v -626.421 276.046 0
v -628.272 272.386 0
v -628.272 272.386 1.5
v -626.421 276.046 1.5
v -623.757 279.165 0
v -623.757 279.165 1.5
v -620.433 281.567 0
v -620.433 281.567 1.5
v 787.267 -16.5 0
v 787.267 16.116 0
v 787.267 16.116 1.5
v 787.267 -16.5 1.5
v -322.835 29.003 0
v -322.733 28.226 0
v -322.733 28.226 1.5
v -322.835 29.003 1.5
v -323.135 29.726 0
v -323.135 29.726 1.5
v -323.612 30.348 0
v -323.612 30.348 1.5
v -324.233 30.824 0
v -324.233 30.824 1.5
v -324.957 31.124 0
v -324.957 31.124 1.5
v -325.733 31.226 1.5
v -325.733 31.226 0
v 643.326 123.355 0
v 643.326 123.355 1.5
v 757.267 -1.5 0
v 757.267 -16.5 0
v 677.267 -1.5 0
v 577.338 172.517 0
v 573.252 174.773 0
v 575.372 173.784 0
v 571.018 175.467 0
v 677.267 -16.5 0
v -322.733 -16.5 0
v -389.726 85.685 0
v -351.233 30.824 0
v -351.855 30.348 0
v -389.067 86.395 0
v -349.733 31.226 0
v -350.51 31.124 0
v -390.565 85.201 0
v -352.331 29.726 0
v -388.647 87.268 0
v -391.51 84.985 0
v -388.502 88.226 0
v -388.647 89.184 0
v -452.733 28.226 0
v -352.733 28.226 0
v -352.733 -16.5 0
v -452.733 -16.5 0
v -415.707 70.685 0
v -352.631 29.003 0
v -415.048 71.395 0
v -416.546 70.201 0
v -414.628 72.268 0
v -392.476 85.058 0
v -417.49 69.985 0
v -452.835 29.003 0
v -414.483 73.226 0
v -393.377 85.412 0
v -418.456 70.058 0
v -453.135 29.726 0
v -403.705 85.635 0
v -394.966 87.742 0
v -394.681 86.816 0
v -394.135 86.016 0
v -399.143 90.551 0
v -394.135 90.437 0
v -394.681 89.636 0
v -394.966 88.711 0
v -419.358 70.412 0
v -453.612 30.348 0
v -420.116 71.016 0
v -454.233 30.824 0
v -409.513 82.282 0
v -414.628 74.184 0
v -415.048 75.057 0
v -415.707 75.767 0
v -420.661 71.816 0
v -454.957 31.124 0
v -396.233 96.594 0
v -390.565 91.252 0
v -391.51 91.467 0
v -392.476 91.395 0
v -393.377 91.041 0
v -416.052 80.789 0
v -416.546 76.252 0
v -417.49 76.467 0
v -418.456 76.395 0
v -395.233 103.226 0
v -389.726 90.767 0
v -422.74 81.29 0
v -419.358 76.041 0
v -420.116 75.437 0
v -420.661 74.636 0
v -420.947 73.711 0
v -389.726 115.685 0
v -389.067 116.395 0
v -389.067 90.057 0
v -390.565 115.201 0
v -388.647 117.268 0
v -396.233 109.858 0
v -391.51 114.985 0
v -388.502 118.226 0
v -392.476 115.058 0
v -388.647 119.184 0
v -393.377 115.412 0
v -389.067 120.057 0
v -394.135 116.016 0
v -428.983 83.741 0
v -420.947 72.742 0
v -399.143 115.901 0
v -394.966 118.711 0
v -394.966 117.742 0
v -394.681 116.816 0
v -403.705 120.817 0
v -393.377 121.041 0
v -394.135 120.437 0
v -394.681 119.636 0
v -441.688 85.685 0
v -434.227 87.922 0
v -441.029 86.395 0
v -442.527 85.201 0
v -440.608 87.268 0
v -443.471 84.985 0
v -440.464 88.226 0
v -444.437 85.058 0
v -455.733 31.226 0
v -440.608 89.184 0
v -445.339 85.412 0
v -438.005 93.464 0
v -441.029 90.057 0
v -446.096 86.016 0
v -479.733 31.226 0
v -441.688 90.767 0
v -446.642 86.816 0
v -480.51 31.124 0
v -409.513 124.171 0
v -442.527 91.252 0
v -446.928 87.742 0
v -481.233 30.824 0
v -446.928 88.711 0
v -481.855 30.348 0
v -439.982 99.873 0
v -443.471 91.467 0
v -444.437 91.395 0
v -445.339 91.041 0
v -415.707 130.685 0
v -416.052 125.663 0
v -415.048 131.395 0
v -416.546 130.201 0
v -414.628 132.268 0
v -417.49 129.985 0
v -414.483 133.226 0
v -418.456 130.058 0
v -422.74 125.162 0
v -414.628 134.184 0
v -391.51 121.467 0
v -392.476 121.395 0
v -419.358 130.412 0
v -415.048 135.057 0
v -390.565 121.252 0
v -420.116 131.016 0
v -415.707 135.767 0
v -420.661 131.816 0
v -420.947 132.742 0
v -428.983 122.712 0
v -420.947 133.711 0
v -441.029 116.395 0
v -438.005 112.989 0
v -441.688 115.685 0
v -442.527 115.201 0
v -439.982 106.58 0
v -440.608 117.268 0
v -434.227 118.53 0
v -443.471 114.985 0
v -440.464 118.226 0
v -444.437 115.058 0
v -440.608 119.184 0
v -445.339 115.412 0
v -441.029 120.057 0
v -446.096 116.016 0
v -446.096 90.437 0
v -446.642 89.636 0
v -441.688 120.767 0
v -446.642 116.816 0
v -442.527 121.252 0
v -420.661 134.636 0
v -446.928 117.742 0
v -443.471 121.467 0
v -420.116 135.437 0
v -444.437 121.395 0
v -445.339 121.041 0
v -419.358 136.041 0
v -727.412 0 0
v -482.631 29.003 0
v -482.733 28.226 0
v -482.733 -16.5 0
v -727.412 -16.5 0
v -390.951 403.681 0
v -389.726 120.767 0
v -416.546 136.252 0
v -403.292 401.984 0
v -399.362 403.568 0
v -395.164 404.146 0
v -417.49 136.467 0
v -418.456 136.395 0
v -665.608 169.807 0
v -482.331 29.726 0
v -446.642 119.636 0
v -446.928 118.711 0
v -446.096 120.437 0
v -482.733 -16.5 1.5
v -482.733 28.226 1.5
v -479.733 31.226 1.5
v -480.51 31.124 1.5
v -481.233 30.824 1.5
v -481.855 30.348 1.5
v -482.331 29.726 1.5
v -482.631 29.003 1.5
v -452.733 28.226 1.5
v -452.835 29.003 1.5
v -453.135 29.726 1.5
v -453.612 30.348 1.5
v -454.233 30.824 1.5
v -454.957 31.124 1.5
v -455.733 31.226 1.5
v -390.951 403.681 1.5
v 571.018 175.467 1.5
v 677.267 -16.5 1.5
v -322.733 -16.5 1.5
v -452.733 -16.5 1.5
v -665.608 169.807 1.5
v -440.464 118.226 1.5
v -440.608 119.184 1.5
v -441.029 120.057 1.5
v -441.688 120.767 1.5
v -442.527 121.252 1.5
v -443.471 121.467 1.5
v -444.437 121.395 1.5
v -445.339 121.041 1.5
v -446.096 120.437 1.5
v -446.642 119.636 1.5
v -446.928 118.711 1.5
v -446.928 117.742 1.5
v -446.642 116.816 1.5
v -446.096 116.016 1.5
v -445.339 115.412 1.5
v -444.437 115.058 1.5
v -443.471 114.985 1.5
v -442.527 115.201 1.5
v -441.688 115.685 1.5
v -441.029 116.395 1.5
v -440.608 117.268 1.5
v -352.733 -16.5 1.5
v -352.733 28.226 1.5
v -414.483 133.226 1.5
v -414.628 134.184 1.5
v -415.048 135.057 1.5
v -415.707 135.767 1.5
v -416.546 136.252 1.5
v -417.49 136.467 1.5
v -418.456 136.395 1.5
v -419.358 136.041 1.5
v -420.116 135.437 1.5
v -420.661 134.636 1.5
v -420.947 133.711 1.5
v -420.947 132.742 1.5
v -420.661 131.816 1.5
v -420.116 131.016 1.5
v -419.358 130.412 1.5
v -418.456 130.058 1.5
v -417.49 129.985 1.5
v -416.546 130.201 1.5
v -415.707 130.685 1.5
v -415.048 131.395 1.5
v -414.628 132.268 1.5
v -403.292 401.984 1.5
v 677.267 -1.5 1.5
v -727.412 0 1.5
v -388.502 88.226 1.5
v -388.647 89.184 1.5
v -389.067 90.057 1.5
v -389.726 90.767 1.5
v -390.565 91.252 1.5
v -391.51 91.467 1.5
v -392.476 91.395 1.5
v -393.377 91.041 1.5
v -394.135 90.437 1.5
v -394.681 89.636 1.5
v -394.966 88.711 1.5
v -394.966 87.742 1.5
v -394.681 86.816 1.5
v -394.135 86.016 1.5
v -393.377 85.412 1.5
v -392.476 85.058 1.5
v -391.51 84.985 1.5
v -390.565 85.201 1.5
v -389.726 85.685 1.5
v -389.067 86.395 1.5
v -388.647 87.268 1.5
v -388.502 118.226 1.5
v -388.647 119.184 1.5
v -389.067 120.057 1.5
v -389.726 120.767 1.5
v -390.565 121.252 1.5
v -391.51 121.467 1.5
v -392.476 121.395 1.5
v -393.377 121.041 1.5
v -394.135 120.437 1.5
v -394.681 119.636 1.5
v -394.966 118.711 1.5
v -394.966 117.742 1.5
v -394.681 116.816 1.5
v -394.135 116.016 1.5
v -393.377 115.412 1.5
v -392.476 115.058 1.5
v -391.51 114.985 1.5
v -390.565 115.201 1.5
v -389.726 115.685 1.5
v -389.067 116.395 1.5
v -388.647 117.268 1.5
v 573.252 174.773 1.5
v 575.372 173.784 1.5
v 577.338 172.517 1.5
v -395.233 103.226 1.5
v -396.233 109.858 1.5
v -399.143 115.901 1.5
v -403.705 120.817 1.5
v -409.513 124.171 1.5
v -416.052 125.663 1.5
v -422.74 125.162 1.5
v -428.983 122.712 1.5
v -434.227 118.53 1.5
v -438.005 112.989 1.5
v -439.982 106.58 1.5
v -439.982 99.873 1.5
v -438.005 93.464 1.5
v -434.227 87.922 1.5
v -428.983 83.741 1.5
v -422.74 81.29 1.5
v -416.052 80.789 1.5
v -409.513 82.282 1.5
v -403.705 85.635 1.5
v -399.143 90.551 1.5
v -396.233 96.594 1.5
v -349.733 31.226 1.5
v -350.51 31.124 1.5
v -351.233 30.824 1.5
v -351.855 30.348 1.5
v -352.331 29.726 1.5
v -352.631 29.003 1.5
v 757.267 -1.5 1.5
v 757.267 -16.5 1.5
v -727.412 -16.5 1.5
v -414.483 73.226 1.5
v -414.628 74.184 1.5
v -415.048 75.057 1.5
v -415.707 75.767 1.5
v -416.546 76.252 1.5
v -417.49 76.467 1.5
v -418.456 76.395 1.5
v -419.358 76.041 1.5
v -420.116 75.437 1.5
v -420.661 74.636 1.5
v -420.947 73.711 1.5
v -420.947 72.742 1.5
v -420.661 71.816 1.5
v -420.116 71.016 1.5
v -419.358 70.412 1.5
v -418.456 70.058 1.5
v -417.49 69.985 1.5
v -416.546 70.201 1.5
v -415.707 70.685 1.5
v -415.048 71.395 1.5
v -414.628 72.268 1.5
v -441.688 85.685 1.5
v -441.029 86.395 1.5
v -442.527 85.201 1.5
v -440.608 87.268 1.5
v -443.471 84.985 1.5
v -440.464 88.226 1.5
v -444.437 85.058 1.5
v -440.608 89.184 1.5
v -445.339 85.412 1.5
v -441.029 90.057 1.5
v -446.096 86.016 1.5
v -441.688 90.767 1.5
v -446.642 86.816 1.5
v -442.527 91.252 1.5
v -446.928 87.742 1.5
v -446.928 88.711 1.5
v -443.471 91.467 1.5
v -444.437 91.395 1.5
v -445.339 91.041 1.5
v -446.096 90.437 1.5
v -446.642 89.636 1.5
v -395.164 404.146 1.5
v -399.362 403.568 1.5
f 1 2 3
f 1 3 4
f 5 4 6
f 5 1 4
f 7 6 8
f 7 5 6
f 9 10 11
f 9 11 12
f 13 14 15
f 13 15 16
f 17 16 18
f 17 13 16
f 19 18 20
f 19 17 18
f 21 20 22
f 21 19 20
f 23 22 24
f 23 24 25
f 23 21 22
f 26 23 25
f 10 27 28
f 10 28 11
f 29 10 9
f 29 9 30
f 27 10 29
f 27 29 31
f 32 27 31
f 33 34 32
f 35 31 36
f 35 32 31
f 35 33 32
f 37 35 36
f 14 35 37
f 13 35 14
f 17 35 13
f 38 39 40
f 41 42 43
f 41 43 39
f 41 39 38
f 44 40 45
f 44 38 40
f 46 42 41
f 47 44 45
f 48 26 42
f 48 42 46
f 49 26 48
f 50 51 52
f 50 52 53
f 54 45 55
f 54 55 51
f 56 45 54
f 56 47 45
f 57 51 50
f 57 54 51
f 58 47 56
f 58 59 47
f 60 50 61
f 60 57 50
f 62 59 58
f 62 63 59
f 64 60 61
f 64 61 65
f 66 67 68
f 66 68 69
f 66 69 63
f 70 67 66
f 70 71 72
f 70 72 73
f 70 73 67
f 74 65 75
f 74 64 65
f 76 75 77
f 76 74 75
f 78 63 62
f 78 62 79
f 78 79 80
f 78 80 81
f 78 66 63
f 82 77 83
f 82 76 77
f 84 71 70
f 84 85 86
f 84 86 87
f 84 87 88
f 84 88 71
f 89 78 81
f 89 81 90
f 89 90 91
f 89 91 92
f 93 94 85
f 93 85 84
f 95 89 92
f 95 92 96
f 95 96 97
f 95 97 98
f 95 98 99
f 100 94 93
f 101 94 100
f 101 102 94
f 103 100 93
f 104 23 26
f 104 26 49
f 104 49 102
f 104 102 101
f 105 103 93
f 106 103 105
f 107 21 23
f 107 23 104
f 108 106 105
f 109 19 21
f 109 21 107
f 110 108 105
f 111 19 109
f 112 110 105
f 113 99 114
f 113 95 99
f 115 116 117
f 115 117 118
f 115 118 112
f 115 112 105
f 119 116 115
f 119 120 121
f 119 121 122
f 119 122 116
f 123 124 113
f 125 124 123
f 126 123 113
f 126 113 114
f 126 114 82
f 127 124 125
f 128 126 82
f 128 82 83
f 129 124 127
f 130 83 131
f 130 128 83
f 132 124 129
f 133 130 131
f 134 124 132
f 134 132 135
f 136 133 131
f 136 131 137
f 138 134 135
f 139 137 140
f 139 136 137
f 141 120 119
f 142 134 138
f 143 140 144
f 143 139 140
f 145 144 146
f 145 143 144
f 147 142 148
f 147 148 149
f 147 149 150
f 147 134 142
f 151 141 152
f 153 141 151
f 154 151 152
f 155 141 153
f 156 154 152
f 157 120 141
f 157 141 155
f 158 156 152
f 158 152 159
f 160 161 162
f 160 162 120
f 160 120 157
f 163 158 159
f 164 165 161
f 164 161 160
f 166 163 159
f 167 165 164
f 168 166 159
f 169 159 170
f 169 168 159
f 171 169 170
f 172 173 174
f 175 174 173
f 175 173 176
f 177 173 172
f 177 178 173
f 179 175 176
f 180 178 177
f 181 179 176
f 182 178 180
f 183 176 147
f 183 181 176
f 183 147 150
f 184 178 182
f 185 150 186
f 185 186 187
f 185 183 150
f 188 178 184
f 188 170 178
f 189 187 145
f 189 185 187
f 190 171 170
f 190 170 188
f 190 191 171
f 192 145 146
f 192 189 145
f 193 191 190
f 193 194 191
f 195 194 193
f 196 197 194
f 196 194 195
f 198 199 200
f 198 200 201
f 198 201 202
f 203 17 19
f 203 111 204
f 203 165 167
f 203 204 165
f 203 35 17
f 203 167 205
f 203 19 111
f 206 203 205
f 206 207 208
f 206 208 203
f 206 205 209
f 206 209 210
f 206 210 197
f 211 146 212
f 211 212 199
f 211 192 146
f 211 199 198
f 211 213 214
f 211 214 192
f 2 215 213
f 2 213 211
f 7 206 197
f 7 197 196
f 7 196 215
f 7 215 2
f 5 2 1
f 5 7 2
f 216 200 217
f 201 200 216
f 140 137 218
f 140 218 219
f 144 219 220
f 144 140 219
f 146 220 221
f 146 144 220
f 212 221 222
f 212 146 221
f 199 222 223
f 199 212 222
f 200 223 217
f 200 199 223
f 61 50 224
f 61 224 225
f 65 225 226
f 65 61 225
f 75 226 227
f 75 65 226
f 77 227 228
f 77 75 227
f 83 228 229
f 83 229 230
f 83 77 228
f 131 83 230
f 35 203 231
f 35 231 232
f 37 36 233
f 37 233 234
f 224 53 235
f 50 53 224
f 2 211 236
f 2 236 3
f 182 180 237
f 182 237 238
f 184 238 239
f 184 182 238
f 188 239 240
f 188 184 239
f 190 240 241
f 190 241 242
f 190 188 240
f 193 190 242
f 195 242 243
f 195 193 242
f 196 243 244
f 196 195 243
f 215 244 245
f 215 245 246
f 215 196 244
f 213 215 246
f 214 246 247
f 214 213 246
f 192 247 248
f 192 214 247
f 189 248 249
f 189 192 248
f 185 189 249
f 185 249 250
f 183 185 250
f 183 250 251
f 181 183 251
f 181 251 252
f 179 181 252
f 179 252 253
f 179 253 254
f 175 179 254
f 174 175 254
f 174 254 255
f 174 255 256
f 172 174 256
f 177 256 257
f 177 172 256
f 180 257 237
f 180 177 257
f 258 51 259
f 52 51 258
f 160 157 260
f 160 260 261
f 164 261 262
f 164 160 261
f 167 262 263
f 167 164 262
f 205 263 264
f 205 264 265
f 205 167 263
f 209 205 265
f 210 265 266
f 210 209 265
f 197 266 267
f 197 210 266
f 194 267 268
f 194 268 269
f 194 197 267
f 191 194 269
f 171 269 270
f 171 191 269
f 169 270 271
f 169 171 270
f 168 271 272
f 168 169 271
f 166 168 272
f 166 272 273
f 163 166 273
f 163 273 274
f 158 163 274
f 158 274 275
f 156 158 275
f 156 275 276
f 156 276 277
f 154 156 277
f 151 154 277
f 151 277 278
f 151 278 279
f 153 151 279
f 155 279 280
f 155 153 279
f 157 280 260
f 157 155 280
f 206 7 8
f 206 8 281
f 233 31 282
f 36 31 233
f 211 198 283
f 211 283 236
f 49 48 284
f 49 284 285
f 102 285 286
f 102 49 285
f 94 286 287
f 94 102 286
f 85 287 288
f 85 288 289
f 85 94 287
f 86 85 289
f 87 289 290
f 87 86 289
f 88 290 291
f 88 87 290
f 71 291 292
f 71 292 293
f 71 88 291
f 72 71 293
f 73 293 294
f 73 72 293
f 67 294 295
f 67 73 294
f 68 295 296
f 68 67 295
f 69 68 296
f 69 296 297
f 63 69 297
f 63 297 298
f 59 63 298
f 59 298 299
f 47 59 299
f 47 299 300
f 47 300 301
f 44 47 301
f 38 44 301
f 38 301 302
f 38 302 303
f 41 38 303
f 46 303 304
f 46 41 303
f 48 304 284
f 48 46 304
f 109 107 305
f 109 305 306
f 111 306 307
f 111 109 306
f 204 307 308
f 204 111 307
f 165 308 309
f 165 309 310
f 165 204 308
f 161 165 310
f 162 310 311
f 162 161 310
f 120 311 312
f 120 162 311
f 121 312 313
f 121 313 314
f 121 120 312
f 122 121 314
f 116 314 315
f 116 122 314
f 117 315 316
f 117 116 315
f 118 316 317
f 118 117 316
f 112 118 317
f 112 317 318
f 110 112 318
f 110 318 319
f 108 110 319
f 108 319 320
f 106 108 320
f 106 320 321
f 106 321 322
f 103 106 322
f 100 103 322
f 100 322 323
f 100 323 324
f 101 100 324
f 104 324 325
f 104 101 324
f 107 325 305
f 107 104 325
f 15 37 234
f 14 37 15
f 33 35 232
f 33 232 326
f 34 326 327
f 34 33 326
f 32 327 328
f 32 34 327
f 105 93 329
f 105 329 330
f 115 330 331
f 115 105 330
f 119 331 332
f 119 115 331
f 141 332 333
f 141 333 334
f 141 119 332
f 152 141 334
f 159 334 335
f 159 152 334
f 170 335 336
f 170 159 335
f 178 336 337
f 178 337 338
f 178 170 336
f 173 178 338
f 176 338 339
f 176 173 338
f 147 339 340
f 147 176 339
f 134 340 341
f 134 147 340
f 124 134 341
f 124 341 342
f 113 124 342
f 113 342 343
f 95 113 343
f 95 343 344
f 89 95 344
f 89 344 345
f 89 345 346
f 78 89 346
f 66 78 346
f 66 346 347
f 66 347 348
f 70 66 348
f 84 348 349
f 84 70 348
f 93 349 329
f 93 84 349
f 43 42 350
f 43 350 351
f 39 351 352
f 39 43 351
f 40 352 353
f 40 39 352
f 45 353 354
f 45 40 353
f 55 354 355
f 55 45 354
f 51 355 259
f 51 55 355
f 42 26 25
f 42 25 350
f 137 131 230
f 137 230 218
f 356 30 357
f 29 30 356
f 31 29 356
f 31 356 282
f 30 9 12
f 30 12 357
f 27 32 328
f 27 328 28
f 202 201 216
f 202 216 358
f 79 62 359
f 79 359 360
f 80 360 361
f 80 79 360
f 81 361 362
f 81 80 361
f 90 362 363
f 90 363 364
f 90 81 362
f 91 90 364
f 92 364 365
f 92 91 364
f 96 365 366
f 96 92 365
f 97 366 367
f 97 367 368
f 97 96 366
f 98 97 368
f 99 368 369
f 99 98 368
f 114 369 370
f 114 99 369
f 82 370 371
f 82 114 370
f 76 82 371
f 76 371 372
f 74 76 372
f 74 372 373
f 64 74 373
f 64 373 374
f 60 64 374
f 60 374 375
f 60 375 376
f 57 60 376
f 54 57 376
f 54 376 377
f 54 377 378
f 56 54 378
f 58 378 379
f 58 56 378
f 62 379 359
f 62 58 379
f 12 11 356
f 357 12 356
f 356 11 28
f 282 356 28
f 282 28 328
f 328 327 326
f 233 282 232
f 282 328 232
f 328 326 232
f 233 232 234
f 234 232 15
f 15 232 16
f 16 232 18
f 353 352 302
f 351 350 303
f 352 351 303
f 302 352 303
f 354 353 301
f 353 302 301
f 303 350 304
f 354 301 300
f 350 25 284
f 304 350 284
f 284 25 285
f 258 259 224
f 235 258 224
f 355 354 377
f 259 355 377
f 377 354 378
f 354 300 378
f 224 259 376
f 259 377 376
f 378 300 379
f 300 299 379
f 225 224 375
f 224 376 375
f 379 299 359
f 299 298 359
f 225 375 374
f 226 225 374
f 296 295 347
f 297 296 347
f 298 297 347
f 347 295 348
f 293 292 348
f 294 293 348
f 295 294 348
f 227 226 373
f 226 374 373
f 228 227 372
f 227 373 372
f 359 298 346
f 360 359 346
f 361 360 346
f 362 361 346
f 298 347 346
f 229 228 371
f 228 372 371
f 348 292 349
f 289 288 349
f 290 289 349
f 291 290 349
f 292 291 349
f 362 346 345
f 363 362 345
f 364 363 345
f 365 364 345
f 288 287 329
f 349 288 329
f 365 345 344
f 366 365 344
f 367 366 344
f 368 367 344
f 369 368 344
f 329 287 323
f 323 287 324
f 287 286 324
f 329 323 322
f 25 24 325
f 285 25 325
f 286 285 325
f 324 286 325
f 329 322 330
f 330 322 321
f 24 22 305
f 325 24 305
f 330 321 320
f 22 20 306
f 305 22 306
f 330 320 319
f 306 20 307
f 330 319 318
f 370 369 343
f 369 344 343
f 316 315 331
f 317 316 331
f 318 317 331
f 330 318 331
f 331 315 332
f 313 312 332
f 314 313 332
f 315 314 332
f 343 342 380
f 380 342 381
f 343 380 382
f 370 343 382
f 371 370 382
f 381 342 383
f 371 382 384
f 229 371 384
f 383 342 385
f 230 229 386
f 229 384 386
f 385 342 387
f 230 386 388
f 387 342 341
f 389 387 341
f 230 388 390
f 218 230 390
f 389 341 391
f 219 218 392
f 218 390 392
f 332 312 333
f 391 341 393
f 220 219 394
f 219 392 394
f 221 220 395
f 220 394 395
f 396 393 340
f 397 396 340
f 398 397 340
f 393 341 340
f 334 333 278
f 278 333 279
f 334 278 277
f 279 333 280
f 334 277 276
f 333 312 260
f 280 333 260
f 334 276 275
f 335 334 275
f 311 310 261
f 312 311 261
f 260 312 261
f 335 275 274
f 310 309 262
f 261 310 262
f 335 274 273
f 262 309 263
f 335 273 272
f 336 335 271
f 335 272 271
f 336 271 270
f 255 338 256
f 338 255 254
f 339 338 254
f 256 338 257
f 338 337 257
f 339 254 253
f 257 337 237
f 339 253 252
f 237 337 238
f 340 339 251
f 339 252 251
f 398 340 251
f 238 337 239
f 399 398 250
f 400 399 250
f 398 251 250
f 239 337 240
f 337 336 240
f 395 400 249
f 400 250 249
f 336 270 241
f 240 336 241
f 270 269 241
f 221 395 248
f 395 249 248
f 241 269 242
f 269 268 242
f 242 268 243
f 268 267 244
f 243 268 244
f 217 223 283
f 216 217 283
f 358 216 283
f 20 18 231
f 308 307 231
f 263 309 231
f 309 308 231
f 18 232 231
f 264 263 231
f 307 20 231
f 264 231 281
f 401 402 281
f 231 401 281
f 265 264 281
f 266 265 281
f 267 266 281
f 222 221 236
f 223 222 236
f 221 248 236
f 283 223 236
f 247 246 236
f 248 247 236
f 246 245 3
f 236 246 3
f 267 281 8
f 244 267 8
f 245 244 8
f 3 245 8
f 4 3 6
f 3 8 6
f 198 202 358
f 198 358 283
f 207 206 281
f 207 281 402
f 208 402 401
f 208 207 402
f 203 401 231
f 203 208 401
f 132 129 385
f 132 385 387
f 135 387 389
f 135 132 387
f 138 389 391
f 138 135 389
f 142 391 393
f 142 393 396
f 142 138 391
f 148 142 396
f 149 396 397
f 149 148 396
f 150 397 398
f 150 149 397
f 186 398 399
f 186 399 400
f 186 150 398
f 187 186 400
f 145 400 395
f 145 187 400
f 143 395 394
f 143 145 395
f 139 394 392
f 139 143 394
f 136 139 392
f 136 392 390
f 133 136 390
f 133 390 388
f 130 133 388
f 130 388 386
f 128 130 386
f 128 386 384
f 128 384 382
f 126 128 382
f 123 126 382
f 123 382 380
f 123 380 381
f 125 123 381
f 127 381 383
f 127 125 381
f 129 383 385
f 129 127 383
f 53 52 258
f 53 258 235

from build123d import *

# Parameters (mm, degrees)
SKETCH_1_R             = 3.25
SKETCH_1_R_2           = 22.5
SM_BASE_FLANGE_1_DEPTH = 1.5


# Sheet-metal steps are written as plain solids
with BuildPart() as part:
    # Sketch 1 → Базовая кромка1 (new body)
    with BuildSketch(Plane.XY):
        with BuildLine():
            Line((677.266802552, -1.5), (677.266802552, -16.5))
            Line((677.266802552, -16.5), (-322.733197448, -16.5))
            Line((-322.733197448, -16.5), (-322.733197448, 4.22618932))
            Line((-322.733197448, 4.22618932), (-322.733197448, 28.22618932))
            ThreePointArc((-322.733197448, 28.22618932), (-323.611877105, 30.347509663), (-325.733197448, 31.22618932))
            Line((-325.733197448, 31.22618932), (-349.733197448, 31.22618932))
            ThreePointArc((-349.733197448, 31.22618932), (-351.854517792, 30.347509663), (-352.733197448, 28.22618932))
            Line((-352.733197448, 28.22618932), (-352.733197448, 4.22618932))
            Line((-352.733197448, 4.22618932), (-352.733197448, -16.5))
            Line((-352.733197448, -16.5), (-452.733197448, -16.5))
            Line((-452.733197448, -16.5), (-452.733197448, 4.22618932))
            Line((-452.733197448, 4.22618932), (-452.733197448, 28.22618932))
            ThreePointArc((-452.733197448, 28.22618932), (-453.611877105, 30.347509663), (-455.733197448, 31.22618932))
            Line((-455.733197448, 31.22618932), (-479.733197448, 31.22618932))
            ThreePointArc((-479.733197448, 31.22618932), (-481.854517792, 30.347509663), (-482.733197448, 28.22618932))
            Line((-482.733197448, 28.22618932), (-482.733197448, 4.22618932))
            Line((-482.733197448, 4.22618932), (-482.733197448, -16.5))
            Line((-482.733197448, -16.5), (-727.412308586, -16.5))
            Line((-727.412308586, -16.5), (-727.412308586, 0))
            Line((-727.412308586, 0), (-665.607683437, 169.806812014))
            Line((-665.607683437, 169.806812014), (-628.27182662, 272.386235556))
            ThreePointArc((-628.27182662, 272.386235556), (-625.181995264, 277.685039029), (-620.432527225, 281.566653306))
            Line((-620.432527225, 281.566653306), (-403.291964068, 401.983925448))
            ThreePointArc((-403.291964068, 401.983925448), (-397.280386008, 403.986243464), (-390.951446304, 403.681496942))
            Line((-390.951446304, 403.681496942), (571.017994956, 175.466516041))
            ThreePointArc((571.017994956, 175.466516041), (574.328905861, 174.314751992), (577.338388414, 172.517057299))
            Line((577.338388414, 172.517057299), (643.325554365, 123.355108982))
            Line((643.325554365, 123.355108982), (787.266802552, 16.115585934))
            Line((787.266802552, 16.115585934), (787.266802552, -16.5))
            Line((787.266802552, -16.5), (757.266802552, -16.5))
            Line((757.266802552, -16.5), (757.266802552, -1.5))
            Line((757.266802552, -1.5), (677.266802552, -1.5))
        make_face()
        with Locations((-417.733197448, 133.22618932)):
            Circle(SKETCH_1_R, mode=Mode.SUBTRACT)
        with Locations((-417.733197448, 103.22618932)):
            Circle(SKETCH_1_R_2, mode=Mode.SUBTRACT)
        with Locations((-391.752435335, 118.22618932)):
            Circle(SKETCH_1_R, mode=Mode.SUBTRACT)
        with Locations((-391.752435335, 88.22618932)):
            Circle(SKETCH_1_R, mode=Mode.SUBTRACT)
        with Locations((-417.733197448, 73.22618932)):
            Circle(SKETCH_1_R, mode=Mode.SUBTRACT)
        with Locations((-443.713959562, 88.22618932)):
            Circle(SKETCH_1_R, mode=Mode.SUBTRACT)
        with Locations((-443.713959562, 118.22618932)):
            Circle(SKETCH_1_R, mode=Mode.SUBTRACT)
    extrude(amount=SM_BASE_FLANGE_1_DEPTH)


solid = part.part
